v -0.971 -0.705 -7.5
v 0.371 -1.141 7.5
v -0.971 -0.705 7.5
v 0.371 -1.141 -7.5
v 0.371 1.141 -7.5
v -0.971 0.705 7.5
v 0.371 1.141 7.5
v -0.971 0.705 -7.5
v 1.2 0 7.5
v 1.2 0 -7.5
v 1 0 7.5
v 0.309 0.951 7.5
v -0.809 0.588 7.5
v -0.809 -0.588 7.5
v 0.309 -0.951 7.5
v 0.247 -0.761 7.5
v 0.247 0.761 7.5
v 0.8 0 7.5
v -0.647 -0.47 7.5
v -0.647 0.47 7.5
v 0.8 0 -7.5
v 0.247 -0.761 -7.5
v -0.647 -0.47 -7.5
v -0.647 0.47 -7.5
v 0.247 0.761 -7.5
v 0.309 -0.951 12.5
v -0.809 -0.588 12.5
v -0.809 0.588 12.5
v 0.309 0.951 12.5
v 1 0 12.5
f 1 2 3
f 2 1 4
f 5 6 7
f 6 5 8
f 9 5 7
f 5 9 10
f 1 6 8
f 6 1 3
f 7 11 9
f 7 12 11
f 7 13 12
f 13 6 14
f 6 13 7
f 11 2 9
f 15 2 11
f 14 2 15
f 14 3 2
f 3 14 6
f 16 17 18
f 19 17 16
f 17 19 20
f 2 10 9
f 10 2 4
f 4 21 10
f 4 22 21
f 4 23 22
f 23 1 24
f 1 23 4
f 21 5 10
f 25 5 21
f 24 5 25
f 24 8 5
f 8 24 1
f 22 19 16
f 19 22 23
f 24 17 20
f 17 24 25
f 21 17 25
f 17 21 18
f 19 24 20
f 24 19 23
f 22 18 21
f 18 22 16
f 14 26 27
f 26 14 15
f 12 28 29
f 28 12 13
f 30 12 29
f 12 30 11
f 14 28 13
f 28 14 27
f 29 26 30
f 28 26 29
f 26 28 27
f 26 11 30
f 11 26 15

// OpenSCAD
// Parameters
tubing_type = 0; //[0:3:1]
length = 15; //[7.5:30:0.5]
forced_id = 0; //[0:10:0.1]
center = 1; //[0:1:1]
eps = 0.8; //[0.5:2:0.1]
preset_id_0 = 1.6; //[0.8:3.2:0.1]
preset_od_0 = 2.4; //[1.2:4.8:0.1]
preset_id_1 = 2.4; //[1.2:4.8:0.1]
preset_od_1 = 3.2; //[1.6:6.4:0.1]
preset_id_2 = 3.2; //[1.6:6.4:0.1]
preset_od_2 = 4.8; //[2.4:9.6:0.1]
preset_id_3 = 4.8; //[2.4:9.6:0.1]
preset_od_3 = 6.4; //[3.2:12.8:0.1]

// Tubing module
module tubing() {
  // Calculate diameters based on tubing type and forced ID
  original_id = (forced_id > 0) ? forced_id : 
                (tubing_type == 0 ? preset_id_0 : 
                (tubing_type == 1 ? preset_id_1 : 
                (tubing_type == 2 ? preset_id_2 : preset_id_3)));
  original_od = (tubing_type == 0 ? preset_od_0 : 
                (tubing_type == 1 ? preset_od_1 : 
                (tubing_type == 2 ? preset_od_2 : preset_od_3)));
  id = original_id;
  od = original_od + (id - original_id);

  // Outer tubing
  color([0.85, 0.85, 0.8]) {
    difference() {
      translate([0, 0, (center == 1 ? 0 : length / 2)]) 
        cylinder(h=length, r=od / 2, center=true);
      // Inner tubing
      translate([0, 0, (center == 1 ? 0 : length / 2)]) 
        cylinder(h=length + 2 * eps, r=id / 2, center=true);
    }
  }
}

// Sleeved Resistor module
module sleeved_resistor() {
  bare_length = 5;
  resistor_diameter = 2;

  color([0.2, 0.2, 0.2]) {
    translate([0, 0, (center == 1 ? 0 : bare_length / 2)]) 
      cylinder(h=bare_length, r=resistor_diameter / 2, center=true);
  }
}

// Assembly module
module assembly() {
  tubing();
  translate([0, 0, length / 2 + 2.5]) sleeved_resistor();
}

// Call the assembly
assembly();
